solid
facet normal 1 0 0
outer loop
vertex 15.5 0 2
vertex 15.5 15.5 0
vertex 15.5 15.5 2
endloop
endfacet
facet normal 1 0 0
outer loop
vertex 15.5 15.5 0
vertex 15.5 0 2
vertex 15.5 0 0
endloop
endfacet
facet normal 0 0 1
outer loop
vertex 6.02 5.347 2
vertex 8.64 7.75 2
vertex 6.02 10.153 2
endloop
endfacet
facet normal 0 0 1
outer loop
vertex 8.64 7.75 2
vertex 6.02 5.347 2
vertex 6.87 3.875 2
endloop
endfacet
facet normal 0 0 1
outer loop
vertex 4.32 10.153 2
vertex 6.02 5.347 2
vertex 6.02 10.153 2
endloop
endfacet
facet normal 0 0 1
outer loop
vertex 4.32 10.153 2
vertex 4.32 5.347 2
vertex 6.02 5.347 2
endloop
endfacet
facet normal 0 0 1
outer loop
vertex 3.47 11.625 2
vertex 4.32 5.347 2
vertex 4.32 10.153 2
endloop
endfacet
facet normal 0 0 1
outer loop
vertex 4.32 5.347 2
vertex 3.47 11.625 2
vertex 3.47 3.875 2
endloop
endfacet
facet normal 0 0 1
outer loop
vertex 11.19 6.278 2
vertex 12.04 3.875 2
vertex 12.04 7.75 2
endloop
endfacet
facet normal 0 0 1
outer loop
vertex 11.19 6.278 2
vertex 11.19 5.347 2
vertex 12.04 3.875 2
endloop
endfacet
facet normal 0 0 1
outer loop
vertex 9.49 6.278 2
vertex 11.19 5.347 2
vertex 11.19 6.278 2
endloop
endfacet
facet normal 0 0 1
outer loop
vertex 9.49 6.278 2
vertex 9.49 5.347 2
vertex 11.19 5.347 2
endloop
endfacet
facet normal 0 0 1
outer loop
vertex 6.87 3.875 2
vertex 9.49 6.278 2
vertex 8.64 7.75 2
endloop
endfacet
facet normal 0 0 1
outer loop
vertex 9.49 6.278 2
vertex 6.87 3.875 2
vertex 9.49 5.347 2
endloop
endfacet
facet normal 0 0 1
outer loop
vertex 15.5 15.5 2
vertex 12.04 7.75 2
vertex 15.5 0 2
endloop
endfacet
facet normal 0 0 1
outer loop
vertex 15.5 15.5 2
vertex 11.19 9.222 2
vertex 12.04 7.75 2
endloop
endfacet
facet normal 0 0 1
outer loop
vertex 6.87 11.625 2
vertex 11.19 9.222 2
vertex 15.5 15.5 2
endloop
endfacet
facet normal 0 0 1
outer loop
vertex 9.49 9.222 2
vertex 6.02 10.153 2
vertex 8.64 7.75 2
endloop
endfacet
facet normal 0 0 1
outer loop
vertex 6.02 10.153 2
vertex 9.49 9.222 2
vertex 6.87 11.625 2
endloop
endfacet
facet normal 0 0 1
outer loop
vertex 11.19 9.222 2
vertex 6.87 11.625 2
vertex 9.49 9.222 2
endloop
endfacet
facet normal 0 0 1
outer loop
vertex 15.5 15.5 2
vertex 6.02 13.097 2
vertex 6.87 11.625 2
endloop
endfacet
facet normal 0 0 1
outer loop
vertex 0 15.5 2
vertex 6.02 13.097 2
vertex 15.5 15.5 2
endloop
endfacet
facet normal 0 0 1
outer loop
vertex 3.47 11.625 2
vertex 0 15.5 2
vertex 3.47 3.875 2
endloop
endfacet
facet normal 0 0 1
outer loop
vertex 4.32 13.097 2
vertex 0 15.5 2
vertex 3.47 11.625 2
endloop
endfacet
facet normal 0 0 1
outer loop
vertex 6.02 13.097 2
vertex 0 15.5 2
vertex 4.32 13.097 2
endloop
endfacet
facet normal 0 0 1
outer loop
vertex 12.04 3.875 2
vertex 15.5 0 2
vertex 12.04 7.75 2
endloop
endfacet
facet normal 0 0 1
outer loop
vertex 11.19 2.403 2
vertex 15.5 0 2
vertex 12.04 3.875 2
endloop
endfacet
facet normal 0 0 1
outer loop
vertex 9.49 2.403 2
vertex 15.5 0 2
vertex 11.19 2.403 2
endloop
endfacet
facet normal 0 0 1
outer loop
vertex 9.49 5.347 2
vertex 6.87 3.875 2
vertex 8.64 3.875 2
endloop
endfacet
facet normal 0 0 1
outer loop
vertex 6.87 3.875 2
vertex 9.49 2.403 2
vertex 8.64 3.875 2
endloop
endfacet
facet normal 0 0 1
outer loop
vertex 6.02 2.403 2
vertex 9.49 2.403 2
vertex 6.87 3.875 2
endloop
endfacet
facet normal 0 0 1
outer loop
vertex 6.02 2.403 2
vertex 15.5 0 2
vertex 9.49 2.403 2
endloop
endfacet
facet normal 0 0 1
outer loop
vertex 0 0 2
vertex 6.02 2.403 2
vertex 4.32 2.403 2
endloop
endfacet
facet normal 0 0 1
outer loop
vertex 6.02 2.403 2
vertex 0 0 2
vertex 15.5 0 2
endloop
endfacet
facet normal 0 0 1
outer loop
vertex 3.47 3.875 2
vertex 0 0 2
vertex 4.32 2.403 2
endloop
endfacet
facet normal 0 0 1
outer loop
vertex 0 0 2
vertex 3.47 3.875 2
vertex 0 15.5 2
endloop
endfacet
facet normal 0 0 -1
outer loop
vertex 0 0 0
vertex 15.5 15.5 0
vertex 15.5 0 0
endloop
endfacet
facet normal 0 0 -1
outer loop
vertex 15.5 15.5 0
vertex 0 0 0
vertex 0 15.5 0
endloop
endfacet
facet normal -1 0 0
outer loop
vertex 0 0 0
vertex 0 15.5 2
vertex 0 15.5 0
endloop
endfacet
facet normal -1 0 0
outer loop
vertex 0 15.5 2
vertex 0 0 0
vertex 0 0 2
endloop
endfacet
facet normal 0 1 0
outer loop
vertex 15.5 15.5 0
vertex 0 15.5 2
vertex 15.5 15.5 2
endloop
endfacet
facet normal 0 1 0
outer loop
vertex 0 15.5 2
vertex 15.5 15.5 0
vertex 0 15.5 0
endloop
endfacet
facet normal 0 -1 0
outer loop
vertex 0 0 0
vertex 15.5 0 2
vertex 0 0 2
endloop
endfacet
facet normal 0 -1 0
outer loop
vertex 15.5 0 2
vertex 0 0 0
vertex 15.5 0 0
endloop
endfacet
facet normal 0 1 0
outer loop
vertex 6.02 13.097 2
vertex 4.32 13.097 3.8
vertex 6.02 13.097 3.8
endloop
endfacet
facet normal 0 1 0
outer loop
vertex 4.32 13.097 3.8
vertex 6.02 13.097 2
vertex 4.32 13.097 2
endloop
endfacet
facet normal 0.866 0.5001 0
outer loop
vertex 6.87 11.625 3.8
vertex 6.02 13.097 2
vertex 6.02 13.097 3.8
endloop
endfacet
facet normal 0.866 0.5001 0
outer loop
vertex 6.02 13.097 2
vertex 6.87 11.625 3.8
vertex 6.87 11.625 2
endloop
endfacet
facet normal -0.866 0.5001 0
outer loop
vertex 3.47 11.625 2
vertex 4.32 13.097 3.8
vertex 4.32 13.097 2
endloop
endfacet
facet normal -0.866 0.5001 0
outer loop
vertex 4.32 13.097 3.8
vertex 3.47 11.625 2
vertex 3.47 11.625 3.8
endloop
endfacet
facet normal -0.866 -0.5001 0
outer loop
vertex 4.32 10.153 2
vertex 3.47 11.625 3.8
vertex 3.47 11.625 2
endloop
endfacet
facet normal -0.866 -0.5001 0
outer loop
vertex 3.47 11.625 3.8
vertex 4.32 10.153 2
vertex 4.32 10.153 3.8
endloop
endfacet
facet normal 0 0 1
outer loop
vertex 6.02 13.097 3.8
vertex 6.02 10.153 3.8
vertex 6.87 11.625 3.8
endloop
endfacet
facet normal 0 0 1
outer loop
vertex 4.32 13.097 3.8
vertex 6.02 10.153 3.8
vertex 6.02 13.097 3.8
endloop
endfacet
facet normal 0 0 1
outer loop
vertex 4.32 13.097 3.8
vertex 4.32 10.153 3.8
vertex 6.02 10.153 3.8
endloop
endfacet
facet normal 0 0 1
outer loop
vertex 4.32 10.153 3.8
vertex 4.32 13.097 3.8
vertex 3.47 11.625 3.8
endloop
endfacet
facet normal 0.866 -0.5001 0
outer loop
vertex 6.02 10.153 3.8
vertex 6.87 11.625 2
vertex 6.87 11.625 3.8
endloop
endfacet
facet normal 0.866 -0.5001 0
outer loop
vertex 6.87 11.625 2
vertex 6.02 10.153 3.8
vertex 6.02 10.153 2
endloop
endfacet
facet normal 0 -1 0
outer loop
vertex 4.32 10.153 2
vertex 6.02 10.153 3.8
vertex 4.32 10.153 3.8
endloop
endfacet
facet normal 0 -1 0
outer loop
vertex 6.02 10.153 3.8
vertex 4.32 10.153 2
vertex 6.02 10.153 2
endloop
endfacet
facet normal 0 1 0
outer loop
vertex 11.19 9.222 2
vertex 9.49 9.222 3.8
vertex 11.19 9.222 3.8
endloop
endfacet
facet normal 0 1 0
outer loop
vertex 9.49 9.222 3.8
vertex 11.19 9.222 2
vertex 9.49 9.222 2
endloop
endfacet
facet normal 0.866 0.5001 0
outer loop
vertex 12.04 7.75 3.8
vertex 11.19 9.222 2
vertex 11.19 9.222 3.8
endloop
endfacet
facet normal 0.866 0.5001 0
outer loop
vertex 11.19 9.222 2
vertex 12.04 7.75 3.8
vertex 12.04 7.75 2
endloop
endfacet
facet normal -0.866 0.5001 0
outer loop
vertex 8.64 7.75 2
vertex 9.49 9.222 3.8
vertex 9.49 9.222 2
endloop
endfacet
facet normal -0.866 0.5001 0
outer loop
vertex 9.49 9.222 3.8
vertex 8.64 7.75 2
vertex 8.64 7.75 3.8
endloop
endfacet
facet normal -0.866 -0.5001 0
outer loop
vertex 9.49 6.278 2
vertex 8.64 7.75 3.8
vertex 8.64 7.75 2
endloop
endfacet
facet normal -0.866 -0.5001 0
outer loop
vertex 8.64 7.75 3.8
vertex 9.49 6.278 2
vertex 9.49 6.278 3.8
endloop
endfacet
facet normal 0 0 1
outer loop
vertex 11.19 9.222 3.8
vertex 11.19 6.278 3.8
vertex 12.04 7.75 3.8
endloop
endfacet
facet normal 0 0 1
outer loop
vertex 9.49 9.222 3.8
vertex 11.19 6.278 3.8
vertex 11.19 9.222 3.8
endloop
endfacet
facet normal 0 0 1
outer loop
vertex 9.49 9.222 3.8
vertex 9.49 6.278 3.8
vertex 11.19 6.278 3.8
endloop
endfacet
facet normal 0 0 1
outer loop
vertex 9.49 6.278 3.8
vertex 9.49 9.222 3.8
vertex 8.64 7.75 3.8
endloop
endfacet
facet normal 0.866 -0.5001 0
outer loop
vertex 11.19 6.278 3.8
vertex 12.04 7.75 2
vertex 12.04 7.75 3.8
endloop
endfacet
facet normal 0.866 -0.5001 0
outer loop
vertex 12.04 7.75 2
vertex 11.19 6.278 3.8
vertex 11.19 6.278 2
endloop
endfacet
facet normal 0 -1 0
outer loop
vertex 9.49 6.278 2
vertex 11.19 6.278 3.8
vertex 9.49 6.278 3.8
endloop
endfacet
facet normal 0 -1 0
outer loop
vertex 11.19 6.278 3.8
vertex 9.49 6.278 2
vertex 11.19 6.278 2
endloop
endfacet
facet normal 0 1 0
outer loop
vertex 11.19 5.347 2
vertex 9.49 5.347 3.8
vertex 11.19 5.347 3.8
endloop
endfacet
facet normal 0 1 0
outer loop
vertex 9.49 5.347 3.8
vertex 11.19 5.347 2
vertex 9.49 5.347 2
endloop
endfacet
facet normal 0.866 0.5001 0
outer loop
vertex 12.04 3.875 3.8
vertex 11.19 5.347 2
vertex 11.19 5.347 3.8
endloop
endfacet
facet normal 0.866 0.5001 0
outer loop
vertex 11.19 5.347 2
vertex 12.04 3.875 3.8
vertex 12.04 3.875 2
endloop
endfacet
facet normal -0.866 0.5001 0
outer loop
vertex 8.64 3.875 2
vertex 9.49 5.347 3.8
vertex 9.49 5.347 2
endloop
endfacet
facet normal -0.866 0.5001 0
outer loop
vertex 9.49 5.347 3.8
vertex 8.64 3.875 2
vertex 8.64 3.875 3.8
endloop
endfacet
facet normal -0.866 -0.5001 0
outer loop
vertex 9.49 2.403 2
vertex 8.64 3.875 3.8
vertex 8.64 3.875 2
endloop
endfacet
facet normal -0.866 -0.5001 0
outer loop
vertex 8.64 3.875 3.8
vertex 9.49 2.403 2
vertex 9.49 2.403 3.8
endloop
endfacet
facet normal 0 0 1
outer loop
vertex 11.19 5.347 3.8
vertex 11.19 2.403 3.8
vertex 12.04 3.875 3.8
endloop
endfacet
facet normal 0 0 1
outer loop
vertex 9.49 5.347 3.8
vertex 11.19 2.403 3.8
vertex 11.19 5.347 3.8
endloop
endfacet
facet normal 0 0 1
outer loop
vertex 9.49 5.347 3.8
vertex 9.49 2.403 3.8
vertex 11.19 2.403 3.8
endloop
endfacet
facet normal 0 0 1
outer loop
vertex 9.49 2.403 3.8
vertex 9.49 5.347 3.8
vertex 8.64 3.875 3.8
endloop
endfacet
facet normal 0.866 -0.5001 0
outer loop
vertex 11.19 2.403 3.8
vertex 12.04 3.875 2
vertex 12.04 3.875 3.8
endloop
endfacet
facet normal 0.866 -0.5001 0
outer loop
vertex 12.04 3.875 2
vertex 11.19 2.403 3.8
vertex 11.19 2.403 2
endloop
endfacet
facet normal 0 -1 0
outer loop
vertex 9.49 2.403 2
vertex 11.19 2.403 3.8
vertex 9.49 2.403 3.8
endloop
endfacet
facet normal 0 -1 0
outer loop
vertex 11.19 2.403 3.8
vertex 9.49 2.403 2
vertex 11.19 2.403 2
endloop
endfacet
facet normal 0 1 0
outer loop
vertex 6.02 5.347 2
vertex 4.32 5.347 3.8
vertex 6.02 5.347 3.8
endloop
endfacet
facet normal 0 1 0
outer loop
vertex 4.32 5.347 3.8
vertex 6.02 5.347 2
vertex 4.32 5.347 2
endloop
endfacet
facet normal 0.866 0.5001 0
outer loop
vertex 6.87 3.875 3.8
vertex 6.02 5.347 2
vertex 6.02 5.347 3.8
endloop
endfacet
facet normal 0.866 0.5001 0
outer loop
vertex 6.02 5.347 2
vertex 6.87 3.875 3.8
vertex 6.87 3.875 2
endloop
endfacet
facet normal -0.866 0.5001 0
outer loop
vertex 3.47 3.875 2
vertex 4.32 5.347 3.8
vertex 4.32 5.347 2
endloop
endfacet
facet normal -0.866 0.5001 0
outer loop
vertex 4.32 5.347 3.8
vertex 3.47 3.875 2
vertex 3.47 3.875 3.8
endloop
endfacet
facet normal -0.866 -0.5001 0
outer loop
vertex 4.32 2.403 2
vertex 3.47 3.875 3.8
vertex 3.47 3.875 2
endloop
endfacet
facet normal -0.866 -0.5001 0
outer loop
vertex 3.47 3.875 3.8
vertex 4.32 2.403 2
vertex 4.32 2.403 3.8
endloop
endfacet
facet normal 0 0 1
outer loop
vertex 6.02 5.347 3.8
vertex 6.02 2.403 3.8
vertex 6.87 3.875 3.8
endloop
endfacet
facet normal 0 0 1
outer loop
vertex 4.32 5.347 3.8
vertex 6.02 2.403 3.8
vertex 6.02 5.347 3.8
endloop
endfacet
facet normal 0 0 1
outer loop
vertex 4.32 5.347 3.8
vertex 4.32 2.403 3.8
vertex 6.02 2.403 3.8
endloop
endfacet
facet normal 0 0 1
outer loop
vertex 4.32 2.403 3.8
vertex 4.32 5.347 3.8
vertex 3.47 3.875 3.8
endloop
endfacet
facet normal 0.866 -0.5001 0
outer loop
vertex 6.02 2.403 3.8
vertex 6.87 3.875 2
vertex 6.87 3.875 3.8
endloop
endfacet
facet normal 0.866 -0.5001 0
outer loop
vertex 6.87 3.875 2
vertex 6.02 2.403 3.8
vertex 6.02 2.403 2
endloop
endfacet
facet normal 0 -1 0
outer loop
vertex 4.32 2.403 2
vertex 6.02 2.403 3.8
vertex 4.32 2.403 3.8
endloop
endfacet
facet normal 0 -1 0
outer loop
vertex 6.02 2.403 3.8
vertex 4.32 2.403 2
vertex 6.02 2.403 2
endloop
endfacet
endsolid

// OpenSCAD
letter = 26;
//1 for #1 or A
//2 for #2 or B
//3 for #3 or C
//4 for #4 or D
//5 for #5 or E
//6 for #6 or F
//7 for #7 or G
//8 for #8 or H
//9 for #9 or I
//10 for #0 or J
//11 for K
//12 for L
//13 for M
//14 for N
//15 for O
//16 for P
//17 for Q
//18 for R
//19 for S
//20 for T
//21 for U
//22 for V
//23 for W
//24 for X
//25 for Y
//26 for Z

if(letter == 1)//A
{
    cube(size = [15.5,15.5,2], center = false);
    translate([5.17,11.625,1.8]) 
    cylinder(h=2,r1=1.7,r2=1.7, center = false);
}
if(letter == 2)//B
{
    cube(size = [15.5,15.5,2], center = false);
    translate([5.17,11.625,1.8]) 
    cylinder(h=2,r1=1.7,r2=1.7, center = false);
    translate([5.17,7.75,1.8]) 
    cylinder(h=2,r1=1.7,r2=1.7, center = false);
}
if(letter == 3)//C
{
    cube(size = [15.5,15.5,2], center = false);
    translate([5.17,11.625,1.8]) 
    cylinder(h=2,r1=1.7,r2=1.7, center = false);
    translate([10.34,11.625,1.8]) 
    cylinder(h=2,r1=1.7,r2=1.7, center = false);
}
if(letter == 4)//D
{
    cube(size = [15.5,15.5,2], center = false);
    translate([5.17,11.625,1.8]) 
    cylinder(h=2,r1=1.7,r2=1.7, center = false);
    translate([10.34,11.625,1.8]) 
    cylinder(h=2,r1=1.7,r2=1.7, center = false);
    translate([10.34,7.75,1.8]) 
    cylinder(h=2,r1=1.7,r2=1.7, center = false);
}
if(letter == 5)//E
{
    cube(size = [15.5,15.5,2], center = false);
    translate([5.17,11.625,1.8]) 
    cylinder(h=2,r1=1.7,r2=1.7, center = false);
    translate([10.34,7.75,1.8]) 
    cylinder(h=2,r1=1.7,r2=1.7, center = false);
}
if(letter == 6)//F
{
    cube(size = [15.5,15.5,2], center = false);
    translate([5.17,11.625,1.8]) 
    cylinder(h=2,r1=1.7,r2=1.7, center = false);
    translate([10.34,11.625,1.8]) 
    cylinder(h=2,r1=1.7,r2=1.7, center = false);
    translate([5.17,7.75,1.8]) 
    cylinder(h=2,r1=1.7,r2=1.7, center = false);
}
if(letter == 7)//G
{
    cube(size = [15.5,15.5,2], center = false);
    translate([5.17,11.625,1.8]) 
    cylinder(h=2,r1=1.7,r2=1.7, center = false);
    translate([10.34,11.625,1.8]) 
    cylinder(h=2,r1=1.7,r2=1.7, center = false);
    translate([10.34,7.75,1.8]) 
    cylinder(h=2,r1=1.7,r2=1.7, center = false);
    translate([5.17,7.75,1.8]) 
    cylinder(h=2,r1=1.7,r2=1.7, center = false);
}
if(letter == 8)//H
{
    cube(size = [15.5,15.5,2], center = false);
    translate([5.17,11.625,1.8]) 
    cylinder(h=2,r1=1.7,r2=1.7, center = false);
    translate([10.34,7.75,1.8]) 
    cylinder(h=2,r1=1.7,r2=1.7, center = false);
    translate([5.17,7.75,1.8]) 
    cylinder(h=2,r1=1.7,r2=1.7, center = false);
}
if(letter == 9)//I
{
    cube(size = [15.5,15.5,2], center = false);
    translate([10.34,11.625,1.8]) 
    cylinder(h=2,r1=1.7,r2=1.7, center = false);
    translate([5.17,7.75,1.8]) 
    cylinder(h=2,r1=1.7,r2=1.7, center = false);
}
if(letter == 10)//J
{
    cube(size = [15.5,15.5,2], center = false);
    translate([10.34,11.625,1.8]) 
    cylinder(h=2,r1=1.7,r2=1.7, center = false);
    translate([10.34,7.75,1.8]) 
    cylinder(h=2,r1=1.7,r2=1.7, center = false);
    translate([5.17,7.75,1.8]) 
    cylinder(h=2,r1=1.7,r2=1.7, center = false);
}
if(letter == 11)//K
{
    cube(size = [15.5,15.5,2], center = false);
    translate([5.17,11.625,1.8]) 
    cylinder(h=2,r1=1.7,r2=1.7, center = false);
    translate([5.17,3.875,1.8]) 
    cylinder(h=2,r1=1.7,r2=1.7, center = false);
}
if(letter == 12)//L
{
    cube(size = [15.5,15.5,2], center = false);
    translate([5.17,11.625,1.8]) 
    cylinder(h=2,r1=1.7,r2=1.7, center = false);
    translate([5.17,3.875,1.8]) 
    cylinder(h=2,r1=1.7,r2=1.7, center = false);
    translate([5.17,7.75,1.8]) 
    cylinder(h=2,r1=1.7,r2=1.7, center = false);
}
if(letter == 13)//M
{
    cube(size = [15.5,15.5,2], center = false);
    translate([5.17,11.625,1.8]) 
    cylinder(h=2,r1=1.7,r2=1.7, center = false);
    translate([10.34,11.625,1.8]) 
    cylinder(h=2,r1=1.7,r2=1.7, center = false);
    translate([5.17,3.875,1.8]) 
    cylinder(h=2,r1=1.7,r2=1.7, center = false);
}
if(letter == 14)//N
{
    cube(size = [15.5,15.5,2], center = false);
    translate([5.17,11.625,1.8]) 
    cylinder(h=2,r1=1.7,r2=1.7, center = false);
    translate([10.34,11.625,1.8]) 
    cylinder(h=2,r1=1.7,r2=1.7, center = false);
    translate([10.34,7.75,1.8]) 
    cylinder(h=2,r1=1.7,r2=1.7, center = false);
    translate([5.17,3.875,1.8]) 
    cylinder(h=2,r1=1.7,r2=1.7, center = false);
}
if(letter == 15)//O
{
    cube(size = [15.5,15.5,2], center = false);
    translate([5.17,11.625,1.8]) 
    cylinder(h=2,r1=1.7,r2=1.7, center = false);
    translate([10.34,7.75,1.8]) 
    cylinder(h=2,r1=1.7,r2=1.7, center = false);
    translate([5.17,3.875,1.8]) 
    cylinder(h=2,r1=1.7,r2=1.7, center = false);
}
if(letter == 16)//P
{
    cube(size = [15.5,15.5,2], center = false);
    translate([5.17,11.625,1.8]) 
    cylinder(h=2,r1=1.7,r2=1.7, center = false);
    translate([10.34,11.625,1.8]) 
    cylinder(h=2,r1=1.7,r2=1.7, center = false);
    translate([5.17,3.875,1.8]) 
    cylinder(h=2,r1=1.7,r2=1.7, center = false);
    translate([5.17,7.75,1.8]) 
    cylinder(h=2,r1=1.7,r2=1.7, center = false);
}
if(letter == 17)//Q
{
    cube(size = [15.5,15.5,2], center = false);
    translate([5.17,11.625,1.8]) 
    cylinder(h=2,r1=1.7,r2=1.7, center = false);
    translate([10.34,11.625,1.8]) 
    cylinder(h=2,r1=1.7,r2=1.7, center = false);
    translate([10.34,7.75,1.8]) 
    cylinder(h=2,r1=1.7,r2=1.7, center = false);
    translate([5.17,7.75,1.8]) 
    cylinder(h=2,r1=1.7,r2=1.7, center = false);
    translate([5.17,3.875,1.8]) 
    cylinder(h=2,r1=1.7,r2=1.7, center = false);
}
if(letter == 18)//R
{
    cube(size = [15.5,15.5,2], center = false);
    translate([5.17,11.625,1.8]) 
    cylinder(h=2,r1=1.7,r2=1.7, center = false);
    translate([10.34,7.75,1.8]) 
    cylinder(h=2,r1=1.7,r2=1.7, center = false);
    translate([5.17,7.75,1.8]) 
    cylinder(h=2,r1=1.7,r2=1.7, center = false);
    translate([5.17,3.875,1.8]) 
    cylinder(h=2,r1=1.7,r2=1.7, center = false);
}
if(letter == 19)//S
{
    cube(size = [15.5,15.5,2], center = false);
    translate([10.34,11.625,1.8]) 
    cylinder(h=2,r1=1.7,r2=1.7, center = false);
    translate([5.17,7.75,1.8]) 
    cylinder(h=2,r1=1.7,r2=1.7, center = false);
    translate([5.17,3.875,1.8]) 
    cylinder(h=2,r1=1.7,r2=1.7, center = false);
}
if(letter == 20)//T
{
    cube(size = [15.5,15.5,2], center = false);
    translate([10.34,11.625,1.8]) 
    cylinder(h=2,r1=1.7,r2=1.7, center = false);
    translate([10.34,7.75,1.8]) 
    cylinder(h=2,r1=1.7,r2=1.7, center = false);
    translate([5.17,7.75,1.8]) 
    cylinder(h=2,r1=1.7,r2=1.7, center = false);
    translate([5.17,3.875,1.8]) 
    cylinder(h=2,r1=1.7,r2=1.7, center = false);
}
if(letter == 21)//U
{
    cube(size = [15.5,15.5,2], center = false);
    translate([5.17,11.625,1.8]) 
    cylinder(h=2,r1=1.7,r2=1.7, center = false);
    translate([10.34,3.875,1.8]) 
    cylinder(h=2,r1=1.7,r2=1.7, center = false);
    translate([5.17,3.875,1.8]) 
    cylinder(h=2,r1=1.7,r2=1.7, center = false);
}
if(letter == 22)//V
{
    cube(size = [15.5,15.5,2], center = false);
    translate([5.17,11.625,1.8]) 
    cylinder(h=2,r1=1.7,r2=1.7, center = false);
    translate([10.34,3.875,1.8]) 
    cylinder(h=2,r1=1.7,r2=1.7, center = false);
    translate([5.17,7.75,1.8]) 
    cylinder(h=2,r1=1.7,r2=1.7, center = false);
    translate([5.17,3.875,1.8]) 
    cylinder(h=2,r1=1.7,r2=1.7, center = false);
}
if(letter == 23)//W
{
    cube(size = [15.5,15.5,2], center = false);
    translate([10.34,11.625,1.8]) 
    cylinder(h=2,r1=1.7,r2=1.7, center = false);
    translate([10.34,7.75,1.8]) 
    cylinder(h=2,r1=1.7,r2=1.7, center = false);
    translate([5.17,7.75,1.8]) 
    cylinder(h=2,r1=1.7,r2=1.7, center = false);
    translate([10.34,3.875,1.8]) 
    cylinder(h=2,r1=1.7,r2=1.7, center = false);
}
if(letter == 24)//X
{
    cube(size = [15.5,15.5,2], center = false);
    translate([5.17,11.625,1.8]) 
    cylinder(h=2,r1=1.7,r2=1.7, center = false);
    translate([10.34,11.625,1.8]) 
    cylinder(h=2,r1=1.7,r2=1.7, center = false);
    translate([10.34,3.875,1.8]) 
    cylinder(h=2,r1=1.7,r2=1.7, center = false);
    translate([5.17,3.875,1.8]) 
    cylinder(h=2,r1=1.7,r2=1.7, center = false);
}
if(letter == 25)//Y
{
    cube(size = [15.5,15.5,2], center = false);
    translate([5.17,11.625,1.8]) 
    cylinder(h=2,r1=1.7,r2=1.7, center = false);
    translate([10.34,11.625,1.8]) 
    cylinder(h=2,r1=1.7,r2=1.7, center = false);
    translate([10.34,7.75,1.8]) 
    cylinder(h=2,r1=1.7,r2=1.7, center = false);
    translate([10.34,3.875,1.8]) 
    cylinder(h=2,r1=1.7,r2=1.7, center = false);
    translate([5.17,3.875,1.8]) 
    cylinder(h=2,r1=1.7,r2=1.7, center = false);
}
if(letter == 26)//Z
{
    cube(size = [15.5,15.5,2], center = false);
    translate([5.17,11.625,1.8]) 
    cylinder(h=2,r1=1.7,r2=1.7, center = false);
    translate([10.34,7.75,1.8]) 
    cylinder(h=2,r1=1.7,r2=1.7, center = false);
    translate([10.34,3.875,1.8]) 
    cylinder(h=2,r1=1.7,r2=1.7, center = false);
    translate([5.17,3.875,1.8]) 
    cylinder(h=2,r1=1.7,r2=1.7, center = false);
}
